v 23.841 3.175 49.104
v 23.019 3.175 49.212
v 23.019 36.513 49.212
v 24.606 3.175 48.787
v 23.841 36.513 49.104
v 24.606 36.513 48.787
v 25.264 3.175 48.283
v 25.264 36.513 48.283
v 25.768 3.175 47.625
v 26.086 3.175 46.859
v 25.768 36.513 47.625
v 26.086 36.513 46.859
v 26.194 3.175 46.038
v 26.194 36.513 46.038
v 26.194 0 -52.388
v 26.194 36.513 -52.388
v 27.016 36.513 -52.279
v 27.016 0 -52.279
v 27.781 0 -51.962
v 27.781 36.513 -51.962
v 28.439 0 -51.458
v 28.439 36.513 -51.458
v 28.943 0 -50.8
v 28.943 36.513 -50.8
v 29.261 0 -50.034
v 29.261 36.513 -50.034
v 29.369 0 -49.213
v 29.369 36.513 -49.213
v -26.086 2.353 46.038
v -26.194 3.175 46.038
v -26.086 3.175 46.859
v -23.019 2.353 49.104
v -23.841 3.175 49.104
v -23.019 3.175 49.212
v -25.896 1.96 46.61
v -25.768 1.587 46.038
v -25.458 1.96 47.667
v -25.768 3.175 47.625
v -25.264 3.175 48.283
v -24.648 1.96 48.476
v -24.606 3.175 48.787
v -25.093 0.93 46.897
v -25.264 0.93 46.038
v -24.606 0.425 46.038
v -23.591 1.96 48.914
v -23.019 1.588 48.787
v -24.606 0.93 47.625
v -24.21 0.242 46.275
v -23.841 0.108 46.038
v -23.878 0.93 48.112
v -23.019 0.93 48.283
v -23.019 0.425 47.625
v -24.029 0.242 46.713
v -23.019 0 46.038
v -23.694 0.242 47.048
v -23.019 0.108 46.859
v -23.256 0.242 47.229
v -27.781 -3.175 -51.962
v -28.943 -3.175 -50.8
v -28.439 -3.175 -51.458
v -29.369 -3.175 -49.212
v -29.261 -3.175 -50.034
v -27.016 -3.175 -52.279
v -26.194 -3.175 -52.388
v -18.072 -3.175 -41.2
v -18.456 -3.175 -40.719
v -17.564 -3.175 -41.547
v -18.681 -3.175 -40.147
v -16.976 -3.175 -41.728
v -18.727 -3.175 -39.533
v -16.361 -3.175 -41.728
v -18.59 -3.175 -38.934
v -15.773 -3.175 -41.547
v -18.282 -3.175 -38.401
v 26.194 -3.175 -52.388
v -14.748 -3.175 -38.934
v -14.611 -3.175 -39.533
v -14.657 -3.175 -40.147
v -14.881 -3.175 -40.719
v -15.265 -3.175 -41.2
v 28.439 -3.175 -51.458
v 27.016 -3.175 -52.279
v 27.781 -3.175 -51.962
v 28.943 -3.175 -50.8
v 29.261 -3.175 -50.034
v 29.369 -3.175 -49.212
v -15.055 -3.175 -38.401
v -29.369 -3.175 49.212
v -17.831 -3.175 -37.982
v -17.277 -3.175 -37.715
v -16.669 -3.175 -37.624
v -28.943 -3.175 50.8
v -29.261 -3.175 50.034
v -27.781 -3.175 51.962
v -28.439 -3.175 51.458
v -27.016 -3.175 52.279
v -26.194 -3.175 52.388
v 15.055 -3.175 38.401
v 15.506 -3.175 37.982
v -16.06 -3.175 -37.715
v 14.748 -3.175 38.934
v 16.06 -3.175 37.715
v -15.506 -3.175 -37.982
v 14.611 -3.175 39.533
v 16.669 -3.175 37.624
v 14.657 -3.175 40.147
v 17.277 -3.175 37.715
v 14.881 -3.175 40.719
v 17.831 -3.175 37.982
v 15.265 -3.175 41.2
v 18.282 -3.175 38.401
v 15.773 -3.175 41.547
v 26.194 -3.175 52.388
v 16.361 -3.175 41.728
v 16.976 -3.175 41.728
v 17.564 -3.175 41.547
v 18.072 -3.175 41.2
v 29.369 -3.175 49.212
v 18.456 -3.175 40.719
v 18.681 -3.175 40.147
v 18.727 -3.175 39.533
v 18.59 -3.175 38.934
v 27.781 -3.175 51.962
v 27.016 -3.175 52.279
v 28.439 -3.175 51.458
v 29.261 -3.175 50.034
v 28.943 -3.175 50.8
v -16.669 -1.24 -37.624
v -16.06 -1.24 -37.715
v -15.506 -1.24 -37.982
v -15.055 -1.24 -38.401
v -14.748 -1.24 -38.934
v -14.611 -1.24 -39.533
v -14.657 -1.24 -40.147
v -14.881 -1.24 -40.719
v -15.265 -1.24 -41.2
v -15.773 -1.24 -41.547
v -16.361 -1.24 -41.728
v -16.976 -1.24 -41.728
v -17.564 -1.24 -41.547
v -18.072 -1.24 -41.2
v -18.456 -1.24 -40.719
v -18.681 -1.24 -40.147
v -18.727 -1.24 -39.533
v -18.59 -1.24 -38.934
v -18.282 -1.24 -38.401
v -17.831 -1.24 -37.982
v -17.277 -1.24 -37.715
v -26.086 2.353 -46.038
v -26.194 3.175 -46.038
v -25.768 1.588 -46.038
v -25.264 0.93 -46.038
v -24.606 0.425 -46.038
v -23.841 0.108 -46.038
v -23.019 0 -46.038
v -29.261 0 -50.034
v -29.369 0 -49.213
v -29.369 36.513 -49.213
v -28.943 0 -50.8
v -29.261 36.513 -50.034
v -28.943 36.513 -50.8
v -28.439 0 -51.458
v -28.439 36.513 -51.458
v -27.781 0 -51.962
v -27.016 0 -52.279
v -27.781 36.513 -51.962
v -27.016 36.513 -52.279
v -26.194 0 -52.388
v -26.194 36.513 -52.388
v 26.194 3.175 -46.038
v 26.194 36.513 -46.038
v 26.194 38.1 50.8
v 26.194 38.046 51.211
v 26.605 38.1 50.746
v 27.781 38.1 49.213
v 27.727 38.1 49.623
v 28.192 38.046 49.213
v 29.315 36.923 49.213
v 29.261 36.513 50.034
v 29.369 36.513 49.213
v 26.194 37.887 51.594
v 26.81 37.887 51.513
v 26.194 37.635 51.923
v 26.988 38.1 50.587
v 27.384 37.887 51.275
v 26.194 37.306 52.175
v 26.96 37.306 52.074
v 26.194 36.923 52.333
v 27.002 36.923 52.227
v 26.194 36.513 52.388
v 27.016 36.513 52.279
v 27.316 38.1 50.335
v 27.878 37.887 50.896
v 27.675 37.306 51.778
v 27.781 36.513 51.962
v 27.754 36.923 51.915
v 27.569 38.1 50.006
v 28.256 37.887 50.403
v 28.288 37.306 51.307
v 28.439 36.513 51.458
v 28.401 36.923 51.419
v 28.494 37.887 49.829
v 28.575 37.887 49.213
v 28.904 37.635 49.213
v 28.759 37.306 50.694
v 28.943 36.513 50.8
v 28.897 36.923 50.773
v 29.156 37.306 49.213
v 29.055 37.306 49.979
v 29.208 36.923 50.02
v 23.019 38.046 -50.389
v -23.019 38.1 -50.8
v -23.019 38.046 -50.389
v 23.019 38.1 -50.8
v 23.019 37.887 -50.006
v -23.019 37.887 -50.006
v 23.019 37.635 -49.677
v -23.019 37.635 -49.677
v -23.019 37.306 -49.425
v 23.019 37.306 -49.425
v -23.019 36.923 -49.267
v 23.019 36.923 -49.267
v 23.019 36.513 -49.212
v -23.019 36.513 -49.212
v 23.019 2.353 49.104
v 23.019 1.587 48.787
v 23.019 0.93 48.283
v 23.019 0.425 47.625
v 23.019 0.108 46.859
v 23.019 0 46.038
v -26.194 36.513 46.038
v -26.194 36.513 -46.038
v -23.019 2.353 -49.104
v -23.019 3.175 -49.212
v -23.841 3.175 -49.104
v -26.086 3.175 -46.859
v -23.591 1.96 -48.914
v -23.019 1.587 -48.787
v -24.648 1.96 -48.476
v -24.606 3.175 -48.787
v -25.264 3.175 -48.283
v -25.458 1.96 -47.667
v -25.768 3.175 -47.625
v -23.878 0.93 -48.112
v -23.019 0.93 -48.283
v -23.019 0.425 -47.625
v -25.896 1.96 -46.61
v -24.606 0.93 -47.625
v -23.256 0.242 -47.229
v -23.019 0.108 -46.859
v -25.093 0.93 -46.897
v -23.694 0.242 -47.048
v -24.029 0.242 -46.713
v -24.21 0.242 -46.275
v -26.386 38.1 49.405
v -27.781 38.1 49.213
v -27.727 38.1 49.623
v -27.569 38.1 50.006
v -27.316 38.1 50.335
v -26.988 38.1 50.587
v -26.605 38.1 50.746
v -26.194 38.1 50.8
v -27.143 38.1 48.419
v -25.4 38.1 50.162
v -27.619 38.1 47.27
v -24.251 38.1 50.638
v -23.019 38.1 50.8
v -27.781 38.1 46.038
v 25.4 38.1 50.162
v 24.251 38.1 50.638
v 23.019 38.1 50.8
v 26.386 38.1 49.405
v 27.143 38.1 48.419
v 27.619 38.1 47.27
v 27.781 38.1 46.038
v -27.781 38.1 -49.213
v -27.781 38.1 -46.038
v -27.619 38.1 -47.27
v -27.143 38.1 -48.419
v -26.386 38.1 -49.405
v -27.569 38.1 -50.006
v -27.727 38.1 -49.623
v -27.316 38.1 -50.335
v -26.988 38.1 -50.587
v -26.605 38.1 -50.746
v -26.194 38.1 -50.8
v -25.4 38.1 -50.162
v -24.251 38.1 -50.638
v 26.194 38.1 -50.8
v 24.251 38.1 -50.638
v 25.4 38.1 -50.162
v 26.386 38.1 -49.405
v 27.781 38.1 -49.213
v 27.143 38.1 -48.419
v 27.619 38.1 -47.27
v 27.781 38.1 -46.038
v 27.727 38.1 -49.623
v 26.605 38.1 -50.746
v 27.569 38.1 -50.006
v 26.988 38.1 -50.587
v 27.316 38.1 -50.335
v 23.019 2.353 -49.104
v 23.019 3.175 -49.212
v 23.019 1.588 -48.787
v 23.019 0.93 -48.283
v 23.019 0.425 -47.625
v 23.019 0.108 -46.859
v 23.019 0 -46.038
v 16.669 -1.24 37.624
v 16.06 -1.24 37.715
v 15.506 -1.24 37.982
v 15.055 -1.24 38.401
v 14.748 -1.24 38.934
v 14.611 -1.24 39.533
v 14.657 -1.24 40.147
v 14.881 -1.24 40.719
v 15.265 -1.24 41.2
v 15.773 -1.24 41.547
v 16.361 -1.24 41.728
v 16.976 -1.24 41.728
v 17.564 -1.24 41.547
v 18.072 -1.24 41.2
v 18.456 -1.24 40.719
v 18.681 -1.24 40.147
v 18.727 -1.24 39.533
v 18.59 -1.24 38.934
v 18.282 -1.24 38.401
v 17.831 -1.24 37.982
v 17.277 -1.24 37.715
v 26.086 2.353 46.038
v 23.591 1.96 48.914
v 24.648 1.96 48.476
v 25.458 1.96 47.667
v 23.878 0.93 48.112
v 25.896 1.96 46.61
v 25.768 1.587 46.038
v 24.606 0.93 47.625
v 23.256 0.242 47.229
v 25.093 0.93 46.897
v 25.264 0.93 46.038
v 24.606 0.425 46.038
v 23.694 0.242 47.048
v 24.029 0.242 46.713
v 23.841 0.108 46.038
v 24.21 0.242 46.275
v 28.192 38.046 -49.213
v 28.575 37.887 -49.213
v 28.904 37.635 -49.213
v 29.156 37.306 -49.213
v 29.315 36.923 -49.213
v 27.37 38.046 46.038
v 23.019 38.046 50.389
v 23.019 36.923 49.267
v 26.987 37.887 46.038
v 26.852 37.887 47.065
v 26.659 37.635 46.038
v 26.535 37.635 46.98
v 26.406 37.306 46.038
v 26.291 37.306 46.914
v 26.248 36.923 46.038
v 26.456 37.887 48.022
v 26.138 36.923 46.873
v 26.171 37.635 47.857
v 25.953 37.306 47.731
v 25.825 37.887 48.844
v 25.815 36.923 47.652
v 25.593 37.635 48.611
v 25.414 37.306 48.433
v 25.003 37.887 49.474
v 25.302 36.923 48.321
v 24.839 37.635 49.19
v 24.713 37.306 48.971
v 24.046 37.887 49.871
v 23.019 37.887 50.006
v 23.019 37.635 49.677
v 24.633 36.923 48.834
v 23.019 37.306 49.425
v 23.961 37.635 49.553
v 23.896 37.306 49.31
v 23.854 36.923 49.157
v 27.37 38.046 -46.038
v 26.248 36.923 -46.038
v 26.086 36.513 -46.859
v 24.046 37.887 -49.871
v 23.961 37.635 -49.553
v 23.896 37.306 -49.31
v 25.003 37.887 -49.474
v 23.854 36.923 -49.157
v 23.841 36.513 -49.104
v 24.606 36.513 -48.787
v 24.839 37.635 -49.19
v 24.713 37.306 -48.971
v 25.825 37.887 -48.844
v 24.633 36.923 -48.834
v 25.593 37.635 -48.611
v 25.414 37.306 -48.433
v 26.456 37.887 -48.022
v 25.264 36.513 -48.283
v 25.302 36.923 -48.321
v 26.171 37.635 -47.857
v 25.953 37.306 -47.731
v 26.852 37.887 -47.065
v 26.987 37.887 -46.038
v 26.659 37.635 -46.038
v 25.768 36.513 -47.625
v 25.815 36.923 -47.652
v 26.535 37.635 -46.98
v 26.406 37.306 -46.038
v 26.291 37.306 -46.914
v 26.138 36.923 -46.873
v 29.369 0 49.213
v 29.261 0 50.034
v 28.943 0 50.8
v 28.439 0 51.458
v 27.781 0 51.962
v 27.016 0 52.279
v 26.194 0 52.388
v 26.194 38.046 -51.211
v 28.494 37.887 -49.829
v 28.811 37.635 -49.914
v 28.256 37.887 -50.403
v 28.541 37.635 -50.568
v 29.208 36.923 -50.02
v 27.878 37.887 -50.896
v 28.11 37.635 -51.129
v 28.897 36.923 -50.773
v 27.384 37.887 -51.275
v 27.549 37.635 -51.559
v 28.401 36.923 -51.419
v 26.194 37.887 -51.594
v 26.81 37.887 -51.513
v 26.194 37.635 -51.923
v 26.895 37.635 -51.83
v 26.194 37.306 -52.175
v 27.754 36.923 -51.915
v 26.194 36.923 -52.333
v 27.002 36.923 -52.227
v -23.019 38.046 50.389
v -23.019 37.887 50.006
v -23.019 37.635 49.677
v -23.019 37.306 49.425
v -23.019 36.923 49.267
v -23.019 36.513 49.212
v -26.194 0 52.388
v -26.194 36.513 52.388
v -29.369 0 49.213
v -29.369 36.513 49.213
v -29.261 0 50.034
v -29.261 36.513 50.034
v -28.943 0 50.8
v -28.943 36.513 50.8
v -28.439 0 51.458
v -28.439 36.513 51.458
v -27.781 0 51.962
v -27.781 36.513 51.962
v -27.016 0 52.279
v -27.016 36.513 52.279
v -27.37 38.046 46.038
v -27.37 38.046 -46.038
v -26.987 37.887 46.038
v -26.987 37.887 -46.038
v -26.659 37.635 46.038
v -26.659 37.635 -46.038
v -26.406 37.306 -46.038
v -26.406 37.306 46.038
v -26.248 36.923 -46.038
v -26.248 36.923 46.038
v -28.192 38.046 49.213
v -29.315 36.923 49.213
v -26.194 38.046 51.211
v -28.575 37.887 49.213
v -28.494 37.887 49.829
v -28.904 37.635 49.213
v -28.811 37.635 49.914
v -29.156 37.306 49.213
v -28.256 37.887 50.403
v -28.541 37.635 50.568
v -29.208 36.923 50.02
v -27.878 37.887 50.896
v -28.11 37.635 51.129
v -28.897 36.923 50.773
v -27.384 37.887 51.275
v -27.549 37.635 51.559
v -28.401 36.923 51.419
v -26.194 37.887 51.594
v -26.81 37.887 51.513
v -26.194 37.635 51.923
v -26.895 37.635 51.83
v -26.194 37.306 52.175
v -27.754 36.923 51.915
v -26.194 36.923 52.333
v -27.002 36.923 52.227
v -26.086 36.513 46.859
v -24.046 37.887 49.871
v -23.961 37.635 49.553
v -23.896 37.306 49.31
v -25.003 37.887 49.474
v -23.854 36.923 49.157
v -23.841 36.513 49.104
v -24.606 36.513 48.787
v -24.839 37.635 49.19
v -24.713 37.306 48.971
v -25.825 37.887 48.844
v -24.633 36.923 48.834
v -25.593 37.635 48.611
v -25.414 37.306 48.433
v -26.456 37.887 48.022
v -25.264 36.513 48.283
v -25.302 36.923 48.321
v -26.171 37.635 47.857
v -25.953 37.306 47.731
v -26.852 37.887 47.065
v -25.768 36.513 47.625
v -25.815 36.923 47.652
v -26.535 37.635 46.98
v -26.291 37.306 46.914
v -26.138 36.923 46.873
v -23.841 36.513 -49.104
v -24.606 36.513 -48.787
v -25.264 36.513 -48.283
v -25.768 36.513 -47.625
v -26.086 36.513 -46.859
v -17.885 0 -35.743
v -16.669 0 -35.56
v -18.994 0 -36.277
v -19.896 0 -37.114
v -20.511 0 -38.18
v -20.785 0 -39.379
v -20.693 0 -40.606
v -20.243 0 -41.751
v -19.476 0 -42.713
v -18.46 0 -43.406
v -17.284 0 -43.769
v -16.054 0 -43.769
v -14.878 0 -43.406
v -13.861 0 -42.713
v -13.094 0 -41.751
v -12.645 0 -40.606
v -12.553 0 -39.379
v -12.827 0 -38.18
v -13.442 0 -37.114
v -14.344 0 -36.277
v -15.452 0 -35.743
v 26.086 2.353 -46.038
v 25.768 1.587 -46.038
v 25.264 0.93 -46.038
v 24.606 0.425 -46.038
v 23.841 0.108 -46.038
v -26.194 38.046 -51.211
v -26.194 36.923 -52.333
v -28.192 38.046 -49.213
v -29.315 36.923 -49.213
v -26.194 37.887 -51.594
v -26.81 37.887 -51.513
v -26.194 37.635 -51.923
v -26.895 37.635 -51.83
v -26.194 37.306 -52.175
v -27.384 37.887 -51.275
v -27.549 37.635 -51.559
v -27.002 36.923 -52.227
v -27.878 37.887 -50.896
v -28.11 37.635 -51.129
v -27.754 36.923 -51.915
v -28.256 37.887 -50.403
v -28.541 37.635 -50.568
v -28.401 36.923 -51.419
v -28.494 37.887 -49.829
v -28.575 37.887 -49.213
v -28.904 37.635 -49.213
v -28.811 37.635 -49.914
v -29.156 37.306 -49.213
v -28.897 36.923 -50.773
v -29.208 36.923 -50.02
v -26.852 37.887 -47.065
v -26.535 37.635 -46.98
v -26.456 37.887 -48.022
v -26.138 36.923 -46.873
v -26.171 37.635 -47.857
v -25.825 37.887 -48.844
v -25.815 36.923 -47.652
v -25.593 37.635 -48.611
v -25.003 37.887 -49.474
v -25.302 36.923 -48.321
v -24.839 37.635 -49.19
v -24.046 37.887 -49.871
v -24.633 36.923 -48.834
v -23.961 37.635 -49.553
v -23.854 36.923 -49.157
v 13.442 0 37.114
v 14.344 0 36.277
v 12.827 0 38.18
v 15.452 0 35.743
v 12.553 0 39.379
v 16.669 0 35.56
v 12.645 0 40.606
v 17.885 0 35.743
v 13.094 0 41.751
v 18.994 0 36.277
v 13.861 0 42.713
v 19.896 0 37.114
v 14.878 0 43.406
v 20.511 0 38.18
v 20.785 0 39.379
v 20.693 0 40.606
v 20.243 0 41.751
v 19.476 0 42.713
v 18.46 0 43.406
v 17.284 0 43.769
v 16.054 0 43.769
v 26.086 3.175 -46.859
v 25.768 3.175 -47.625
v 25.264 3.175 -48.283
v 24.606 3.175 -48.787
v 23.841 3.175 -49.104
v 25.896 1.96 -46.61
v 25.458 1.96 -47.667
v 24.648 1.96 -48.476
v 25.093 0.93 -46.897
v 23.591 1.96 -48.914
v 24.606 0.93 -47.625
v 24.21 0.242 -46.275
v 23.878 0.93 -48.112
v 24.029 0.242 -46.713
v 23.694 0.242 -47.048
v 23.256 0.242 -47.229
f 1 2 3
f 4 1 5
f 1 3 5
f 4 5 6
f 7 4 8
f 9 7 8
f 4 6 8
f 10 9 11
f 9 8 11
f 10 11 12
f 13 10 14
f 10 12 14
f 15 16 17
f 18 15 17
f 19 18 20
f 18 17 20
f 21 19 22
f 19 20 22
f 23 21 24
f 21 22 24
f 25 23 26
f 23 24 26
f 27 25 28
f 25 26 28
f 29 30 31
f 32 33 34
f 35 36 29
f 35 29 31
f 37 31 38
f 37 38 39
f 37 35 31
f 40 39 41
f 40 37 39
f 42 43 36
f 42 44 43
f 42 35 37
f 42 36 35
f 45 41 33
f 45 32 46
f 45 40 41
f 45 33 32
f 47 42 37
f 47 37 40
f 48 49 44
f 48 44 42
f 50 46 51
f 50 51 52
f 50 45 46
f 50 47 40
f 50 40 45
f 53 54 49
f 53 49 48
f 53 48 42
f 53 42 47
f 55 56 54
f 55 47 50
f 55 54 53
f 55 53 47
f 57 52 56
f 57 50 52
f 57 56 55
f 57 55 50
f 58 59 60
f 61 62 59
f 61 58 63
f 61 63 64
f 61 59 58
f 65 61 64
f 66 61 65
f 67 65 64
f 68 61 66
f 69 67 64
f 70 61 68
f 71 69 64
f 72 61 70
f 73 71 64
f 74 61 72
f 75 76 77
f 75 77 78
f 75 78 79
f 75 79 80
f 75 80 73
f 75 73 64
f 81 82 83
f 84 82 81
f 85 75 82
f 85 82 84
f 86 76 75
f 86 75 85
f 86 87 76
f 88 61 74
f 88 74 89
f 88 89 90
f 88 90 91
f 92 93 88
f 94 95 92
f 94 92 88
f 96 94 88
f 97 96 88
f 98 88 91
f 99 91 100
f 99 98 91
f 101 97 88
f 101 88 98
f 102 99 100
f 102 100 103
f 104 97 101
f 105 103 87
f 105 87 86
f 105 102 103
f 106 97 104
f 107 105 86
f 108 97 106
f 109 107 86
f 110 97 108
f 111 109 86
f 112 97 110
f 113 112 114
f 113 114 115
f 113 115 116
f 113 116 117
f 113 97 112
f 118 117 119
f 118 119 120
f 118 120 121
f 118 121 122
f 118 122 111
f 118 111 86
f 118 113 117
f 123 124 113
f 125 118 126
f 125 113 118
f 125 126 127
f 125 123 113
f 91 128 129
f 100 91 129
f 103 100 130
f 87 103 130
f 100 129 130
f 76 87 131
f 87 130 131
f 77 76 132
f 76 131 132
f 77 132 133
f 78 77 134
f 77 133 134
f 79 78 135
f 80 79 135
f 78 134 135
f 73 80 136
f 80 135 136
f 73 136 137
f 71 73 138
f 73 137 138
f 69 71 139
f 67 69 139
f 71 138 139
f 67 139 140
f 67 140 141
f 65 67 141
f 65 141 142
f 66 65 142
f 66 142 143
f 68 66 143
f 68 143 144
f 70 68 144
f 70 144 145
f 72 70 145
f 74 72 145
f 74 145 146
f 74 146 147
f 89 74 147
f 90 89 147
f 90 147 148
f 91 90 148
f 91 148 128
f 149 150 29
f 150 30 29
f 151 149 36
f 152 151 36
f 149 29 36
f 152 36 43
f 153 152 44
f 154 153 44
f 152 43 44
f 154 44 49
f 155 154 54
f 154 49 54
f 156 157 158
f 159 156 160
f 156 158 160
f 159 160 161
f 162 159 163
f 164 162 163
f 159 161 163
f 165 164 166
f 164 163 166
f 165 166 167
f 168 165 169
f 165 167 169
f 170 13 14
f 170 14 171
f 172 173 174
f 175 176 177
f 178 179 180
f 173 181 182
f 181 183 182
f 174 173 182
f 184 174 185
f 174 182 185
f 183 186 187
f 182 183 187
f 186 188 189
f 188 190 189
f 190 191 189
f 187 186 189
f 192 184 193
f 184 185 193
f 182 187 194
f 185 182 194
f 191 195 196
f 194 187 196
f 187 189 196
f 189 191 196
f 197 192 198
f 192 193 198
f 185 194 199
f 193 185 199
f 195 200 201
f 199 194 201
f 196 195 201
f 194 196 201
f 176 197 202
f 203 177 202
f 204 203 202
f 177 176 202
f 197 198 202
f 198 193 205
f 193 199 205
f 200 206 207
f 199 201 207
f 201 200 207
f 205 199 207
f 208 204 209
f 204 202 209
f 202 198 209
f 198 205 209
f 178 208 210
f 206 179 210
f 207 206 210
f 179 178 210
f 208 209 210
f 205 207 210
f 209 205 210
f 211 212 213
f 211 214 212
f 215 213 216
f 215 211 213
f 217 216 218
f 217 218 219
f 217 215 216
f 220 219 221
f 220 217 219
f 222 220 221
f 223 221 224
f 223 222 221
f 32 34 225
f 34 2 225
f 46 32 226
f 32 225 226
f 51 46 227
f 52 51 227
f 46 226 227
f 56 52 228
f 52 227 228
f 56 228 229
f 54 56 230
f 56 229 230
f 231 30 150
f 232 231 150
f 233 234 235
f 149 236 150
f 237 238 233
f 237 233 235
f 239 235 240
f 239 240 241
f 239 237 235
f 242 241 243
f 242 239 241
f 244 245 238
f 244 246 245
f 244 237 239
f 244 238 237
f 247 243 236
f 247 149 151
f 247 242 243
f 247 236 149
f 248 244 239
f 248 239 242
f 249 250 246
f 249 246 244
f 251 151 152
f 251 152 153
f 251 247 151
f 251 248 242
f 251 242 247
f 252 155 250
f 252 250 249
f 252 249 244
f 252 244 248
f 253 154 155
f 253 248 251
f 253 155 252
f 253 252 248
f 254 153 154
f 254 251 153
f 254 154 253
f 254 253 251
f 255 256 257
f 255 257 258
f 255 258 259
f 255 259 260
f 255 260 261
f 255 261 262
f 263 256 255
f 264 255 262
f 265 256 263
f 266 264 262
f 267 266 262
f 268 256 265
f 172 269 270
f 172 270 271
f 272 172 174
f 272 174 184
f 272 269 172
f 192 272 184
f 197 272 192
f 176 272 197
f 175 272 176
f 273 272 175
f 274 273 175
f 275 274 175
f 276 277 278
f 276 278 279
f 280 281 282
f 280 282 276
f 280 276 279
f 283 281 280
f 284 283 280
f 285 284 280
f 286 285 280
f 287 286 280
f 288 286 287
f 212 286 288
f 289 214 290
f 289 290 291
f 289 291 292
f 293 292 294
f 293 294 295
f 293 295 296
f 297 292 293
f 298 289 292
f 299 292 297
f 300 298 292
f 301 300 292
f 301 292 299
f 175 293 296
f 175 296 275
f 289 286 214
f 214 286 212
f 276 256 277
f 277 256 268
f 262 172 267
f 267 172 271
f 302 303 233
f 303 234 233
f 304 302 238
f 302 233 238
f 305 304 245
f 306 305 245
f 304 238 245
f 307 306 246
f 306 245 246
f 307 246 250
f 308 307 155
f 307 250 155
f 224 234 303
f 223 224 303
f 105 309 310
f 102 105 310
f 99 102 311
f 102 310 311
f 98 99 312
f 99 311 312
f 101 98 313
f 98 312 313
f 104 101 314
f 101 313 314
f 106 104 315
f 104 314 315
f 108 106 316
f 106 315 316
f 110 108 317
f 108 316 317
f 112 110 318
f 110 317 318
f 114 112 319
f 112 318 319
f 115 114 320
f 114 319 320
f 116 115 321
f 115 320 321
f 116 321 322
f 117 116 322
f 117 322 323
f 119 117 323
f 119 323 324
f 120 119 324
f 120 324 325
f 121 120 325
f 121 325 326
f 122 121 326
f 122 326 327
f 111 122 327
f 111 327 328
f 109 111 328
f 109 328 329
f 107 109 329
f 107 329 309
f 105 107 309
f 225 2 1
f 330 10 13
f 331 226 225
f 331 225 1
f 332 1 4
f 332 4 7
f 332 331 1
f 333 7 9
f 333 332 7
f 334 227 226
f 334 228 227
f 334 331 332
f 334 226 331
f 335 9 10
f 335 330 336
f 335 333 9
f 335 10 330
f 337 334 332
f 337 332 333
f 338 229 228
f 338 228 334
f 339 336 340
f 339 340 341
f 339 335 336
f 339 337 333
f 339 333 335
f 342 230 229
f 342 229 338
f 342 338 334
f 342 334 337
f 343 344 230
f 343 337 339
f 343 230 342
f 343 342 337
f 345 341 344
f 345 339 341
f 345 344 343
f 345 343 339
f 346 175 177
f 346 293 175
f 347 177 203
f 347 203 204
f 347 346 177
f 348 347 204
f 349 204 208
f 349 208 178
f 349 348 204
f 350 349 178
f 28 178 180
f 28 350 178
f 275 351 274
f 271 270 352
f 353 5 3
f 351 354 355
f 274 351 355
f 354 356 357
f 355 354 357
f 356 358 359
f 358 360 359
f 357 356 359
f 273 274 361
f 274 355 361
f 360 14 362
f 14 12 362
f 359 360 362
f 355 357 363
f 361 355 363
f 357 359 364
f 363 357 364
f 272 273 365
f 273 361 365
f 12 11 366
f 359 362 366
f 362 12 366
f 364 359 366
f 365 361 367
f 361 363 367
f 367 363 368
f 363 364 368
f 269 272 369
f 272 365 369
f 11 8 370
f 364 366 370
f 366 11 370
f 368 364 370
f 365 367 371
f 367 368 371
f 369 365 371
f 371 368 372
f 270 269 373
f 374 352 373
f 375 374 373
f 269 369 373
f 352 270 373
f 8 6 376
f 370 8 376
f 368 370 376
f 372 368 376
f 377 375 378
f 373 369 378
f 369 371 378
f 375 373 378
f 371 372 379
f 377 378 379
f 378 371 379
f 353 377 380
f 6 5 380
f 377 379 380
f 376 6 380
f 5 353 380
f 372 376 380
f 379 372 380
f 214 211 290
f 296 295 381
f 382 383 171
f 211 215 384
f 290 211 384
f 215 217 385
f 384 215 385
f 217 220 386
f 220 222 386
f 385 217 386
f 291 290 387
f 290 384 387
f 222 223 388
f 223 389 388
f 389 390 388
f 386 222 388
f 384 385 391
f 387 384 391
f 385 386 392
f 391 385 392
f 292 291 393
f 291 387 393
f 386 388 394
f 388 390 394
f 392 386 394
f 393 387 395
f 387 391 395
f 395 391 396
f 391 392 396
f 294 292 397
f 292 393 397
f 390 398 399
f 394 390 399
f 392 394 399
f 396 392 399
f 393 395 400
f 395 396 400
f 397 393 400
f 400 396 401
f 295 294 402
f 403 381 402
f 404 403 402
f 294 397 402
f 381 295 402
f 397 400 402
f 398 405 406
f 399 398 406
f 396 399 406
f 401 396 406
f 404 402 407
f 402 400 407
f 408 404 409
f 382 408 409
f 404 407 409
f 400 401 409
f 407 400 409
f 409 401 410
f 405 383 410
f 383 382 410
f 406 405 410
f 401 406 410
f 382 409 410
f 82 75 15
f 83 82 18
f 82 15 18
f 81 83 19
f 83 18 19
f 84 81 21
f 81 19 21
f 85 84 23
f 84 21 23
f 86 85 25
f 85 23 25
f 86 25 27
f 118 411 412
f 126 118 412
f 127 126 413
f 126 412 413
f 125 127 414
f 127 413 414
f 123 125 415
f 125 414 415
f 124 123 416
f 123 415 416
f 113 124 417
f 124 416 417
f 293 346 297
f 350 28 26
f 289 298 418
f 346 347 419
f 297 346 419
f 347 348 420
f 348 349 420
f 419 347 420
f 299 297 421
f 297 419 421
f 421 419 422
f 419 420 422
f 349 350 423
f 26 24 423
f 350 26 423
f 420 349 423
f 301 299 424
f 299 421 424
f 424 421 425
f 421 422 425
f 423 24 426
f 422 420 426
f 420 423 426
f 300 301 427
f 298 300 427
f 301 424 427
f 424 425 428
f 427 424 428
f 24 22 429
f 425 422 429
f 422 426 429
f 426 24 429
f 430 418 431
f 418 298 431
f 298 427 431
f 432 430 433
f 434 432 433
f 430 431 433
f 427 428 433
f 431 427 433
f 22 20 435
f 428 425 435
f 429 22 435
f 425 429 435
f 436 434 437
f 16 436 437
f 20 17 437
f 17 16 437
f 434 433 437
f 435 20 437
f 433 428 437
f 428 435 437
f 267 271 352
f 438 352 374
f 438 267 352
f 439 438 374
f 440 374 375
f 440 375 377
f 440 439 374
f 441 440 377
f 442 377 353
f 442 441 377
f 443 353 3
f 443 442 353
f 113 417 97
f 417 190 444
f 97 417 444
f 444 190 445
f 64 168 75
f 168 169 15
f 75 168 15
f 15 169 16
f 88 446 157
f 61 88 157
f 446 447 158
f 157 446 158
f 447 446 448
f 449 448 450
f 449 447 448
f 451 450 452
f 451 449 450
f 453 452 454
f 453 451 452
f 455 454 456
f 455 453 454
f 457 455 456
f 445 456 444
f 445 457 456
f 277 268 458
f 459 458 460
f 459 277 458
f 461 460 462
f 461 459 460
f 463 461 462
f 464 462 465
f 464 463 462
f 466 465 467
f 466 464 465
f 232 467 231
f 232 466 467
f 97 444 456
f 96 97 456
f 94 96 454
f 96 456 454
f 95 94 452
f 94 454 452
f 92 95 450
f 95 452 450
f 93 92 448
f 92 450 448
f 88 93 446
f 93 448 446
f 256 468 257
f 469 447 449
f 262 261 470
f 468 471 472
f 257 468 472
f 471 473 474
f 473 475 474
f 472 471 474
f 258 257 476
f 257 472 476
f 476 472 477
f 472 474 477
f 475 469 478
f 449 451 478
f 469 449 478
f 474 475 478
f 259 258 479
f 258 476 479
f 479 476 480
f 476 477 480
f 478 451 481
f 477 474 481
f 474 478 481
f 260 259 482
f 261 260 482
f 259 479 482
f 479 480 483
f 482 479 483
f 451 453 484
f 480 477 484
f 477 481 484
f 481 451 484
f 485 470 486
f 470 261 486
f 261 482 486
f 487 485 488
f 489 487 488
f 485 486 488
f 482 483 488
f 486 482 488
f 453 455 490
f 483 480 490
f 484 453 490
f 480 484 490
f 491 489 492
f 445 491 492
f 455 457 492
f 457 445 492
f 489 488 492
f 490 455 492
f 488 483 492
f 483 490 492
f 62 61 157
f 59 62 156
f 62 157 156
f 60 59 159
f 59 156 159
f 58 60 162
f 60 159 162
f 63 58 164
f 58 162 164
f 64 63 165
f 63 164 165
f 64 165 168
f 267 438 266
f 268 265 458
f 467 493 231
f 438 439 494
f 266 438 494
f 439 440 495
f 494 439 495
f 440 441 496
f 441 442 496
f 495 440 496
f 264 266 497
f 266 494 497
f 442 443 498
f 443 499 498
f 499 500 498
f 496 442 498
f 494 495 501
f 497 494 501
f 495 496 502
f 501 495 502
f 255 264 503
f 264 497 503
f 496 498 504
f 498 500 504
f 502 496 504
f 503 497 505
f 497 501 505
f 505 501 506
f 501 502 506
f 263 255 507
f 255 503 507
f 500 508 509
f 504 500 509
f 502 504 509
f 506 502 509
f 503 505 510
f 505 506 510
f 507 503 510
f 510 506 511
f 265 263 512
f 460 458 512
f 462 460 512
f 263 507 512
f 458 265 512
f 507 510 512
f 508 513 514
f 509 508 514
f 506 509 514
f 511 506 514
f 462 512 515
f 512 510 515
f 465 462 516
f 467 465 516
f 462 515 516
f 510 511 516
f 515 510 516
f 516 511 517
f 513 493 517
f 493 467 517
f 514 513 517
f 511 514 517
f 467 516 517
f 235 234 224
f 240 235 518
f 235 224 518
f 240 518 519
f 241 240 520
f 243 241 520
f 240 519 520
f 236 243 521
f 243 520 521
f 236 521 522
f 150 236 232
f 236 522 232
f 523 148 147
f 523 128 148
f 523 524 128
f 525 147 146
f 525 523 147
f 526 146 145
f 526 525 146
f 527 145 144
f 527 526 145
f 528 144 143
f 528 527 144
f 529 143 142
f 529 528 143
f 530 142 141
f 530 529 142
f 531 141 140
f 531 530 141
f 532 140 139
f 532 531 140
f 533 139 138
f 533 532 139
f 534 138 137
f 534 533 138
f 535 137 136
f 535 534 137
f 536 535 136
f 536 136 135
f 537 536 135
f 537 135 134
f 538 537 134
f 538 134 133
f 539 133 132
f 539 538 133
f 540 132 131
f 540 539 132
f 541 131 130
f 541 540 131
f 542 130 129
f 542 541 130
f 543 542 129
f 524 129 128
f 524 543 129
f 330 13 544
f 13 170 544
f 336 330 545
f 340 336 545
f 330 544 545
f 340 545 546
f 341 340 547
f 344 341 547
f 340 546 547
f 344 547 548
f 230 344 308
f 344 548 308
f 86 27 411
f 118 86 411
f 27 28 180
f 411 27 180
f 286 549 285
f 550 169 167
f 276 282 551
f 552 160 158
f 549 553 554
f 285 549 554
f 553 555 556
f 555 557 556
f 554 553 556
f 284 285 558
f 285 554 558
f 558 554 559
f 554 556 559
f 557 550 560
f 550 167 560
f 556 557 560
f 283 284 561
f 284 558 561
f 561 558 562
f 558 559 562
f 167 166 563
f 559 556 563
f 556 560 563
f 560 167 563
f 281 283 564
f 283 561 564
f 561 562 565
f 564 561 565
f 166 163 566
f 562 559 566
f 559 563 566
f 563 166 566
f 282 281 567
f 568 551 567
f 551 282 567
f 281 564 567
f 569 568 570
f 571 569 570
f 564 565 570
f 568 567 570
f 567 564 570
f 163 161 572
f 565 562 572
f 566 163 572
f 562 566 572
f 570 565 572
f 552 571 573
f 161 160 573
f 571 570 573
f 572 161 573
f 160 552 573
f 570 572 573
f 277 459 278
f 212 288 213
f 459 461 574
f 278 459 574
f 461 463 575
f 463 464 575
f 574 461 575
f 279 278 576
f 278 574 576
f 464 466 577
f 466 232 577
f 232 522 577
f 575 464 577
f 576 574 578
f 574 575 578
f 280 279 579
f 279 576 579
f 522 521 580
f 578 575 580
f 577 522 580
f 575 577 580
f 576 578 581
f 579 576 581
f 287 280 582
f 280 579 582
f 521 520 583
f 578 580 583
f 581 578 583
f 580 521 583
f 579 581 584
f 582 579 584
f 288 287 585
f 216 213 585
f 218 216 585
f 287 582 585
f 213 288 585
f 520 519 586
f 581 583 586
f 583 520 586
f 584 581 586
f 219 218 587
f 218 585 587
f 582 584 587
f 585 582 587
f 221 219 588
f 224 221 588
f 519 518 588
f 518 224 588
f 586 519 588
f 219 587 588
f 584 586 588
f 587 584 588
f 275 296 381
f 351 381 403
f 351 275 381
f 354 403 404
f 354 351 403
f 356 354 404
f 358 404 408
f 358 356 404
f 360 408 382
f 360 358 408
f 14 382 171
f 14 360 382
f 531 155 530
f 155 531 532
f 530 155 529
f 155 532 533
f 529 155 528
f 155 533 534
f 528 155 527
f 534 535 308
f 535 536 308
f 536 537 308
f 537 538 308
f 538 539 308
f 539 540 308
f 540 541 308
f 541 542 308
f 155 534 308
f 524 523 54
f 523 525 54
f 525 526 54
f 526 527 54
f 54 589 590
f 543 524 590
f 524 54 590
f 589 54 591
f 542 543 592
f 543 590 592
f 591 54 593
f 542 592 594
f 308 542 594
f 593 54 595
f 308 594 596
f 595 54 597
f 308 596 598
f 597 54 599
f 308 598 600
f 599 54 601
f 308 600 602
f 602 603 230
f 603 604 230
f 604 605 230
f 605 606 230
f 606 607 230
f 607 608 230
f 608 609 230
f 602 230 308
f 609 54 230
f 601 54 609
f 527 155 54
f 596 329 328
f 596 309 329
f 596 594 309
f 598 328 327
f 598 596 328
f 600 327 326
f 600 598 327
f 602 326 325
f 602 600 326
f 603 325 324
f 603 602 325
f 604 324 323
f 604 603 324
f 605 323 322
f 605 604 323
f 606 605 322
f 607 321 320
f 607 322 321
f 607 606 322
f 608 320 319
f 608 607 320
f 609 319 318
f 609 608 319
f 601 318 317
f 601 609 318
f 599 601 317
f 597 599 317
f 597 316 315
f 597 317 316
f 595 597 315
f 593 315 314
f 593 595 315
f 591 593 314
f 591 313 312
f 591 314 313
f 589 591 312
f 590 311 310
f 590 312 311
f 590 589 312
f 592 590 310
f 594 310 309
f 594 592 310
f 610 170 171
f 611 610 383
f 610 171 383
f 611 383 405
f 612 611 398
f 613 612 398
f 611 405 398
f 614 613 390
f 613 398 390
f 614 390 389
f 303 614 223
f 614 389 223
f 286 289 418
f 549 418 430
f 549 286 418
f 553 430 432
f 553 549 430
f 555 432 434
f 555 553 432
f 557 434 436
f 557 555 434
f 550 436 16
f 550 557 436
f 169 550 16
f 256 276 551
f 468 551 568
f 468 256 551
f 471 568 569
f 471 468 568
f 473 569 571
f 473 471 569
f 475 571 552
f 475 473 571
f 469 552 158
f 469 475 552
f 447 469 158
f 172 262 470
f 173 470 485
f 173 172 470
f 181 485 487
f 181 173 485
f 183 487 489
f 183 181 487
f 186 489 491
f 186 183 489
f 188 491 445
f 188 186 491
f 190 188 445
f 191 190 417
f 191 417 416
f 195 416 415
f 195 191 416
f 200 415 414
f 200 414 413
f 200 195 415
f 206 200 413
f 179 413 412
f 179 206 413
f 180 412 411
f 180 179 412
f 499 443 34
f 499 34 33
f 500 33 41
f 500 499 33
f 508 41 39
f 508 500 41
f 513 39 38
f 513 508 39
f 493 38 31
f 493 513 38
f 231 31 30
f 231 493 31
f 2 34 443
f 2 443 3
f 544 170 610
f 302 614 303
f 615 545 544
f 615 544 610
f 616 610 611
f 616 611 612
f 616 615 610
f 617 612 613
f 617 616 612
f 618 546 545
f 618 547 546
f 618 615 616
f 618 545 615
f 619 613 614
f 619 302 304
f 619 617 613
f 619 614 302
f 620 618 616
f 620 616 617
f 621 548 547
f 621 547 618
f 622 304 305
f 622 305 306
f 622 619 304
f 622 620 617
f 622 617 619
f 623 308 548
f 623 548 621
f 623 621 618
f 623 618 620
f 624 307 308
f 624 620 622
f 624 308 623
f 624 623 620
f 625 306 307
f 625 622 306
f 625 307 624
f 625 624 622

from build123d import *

# Parameters (mm, degrees)
SKETCH1_W           = 58.7375
SKETCH1_H           = 104.775
SKETCH1_W_2         = 52.3875
SKETCH1_H_2         = 98.425
EXTRUDE_THIN1_DEPTH = 38.1
FILLET1_R           = 3.175
BOSS_EXTRUDE1_DEPTH = 3.175
FILLET2_R           = 3.175
SKETCH3_R           = 2.06375
CUT_EXTRUDE1_DEPTH  = 3.175
CIRPATTERN1_COUNT   = 2
FILLET3_R           = 1.5875


with BuildPart() as part:
    # Sketch1 → Extrude-Thin1 (new body)
    with BuildSketch(Plane(origin=(0, 0, 0), x_dir=(1, 0, 0), z_dir=(0, 1, 0))):
        Rectangle(SKETCH1_W, SKETCH1_H)
        Rectangle(SKETCH1_W_2, SKETCH1_H_2, mode=Mode.SUBTRACT)
    extrude(amount=EXTRUDE_THIN1_DEPTH)

    # Fillet1
    fillet1_edges = [part.edges().sort_by_distance(p)[0] for p in [
        (26.19375, 19.05, 49.2125),
        (26.19375, 19.05, -49.2125),
        (-26.19375, 19.05, -49.2125),
        (-26.19375, 19.05, 49.2125),
        (29.36875, 19.05, 52.3875),
        (-29.36875, 19.05, 52.3875),
        (-29.36875, 19.05, -52.3875),
        (29.36875, 19.05, -52.3875),
    ]]
    fillet(fillet1_edges, radius=FILLET1_R)

    # Sketch2 → Boss-Extrude1 (add)
    with BuildSketch(Plane.XZ):
        with BuildLine():
            Line((29.36875, -49.2125), (29.36875, 49.2125))
            ThreePointArc((29.36875, 49.2125), (28.43881403, 51.45756403), (26.19375, 52.3875))
            Line((26.19375, 52.3875), (-26.19375, 52.3875))
            ThreePointArc((-26.19375, 52.3875), (-28.43881403, 51.45756403), (-29.36875, 49.2125))
            Line((-29.36875, 49.2125), (-29.36875, -49.2125))
            ThreePointArc((-29.36875, -49.2125), (-28.43881403, -51.45756403), (-26.19375, -52.3875))
            Line((-26.19375, -52.3875), (26.19375, -52.3875))
            ThreePointArc((26.19375, -52.3875), (28.43881403, -51.45756403), (29.36875, -49.2125))
        make_face()
    extrude(amount=BOSS_EXTRUDE1_DEPTH)

    # Fillet2
    fillet2_edges = [part.edges().sort_by_distance(p)[0] for p in [
        (26.19375, 0, 0),
        (0, 0, -49.2125),
        (-26.19375, 0, 0),
        (0, 0, 49.2125),
        (-25.26381403, 0, 48.28256403),
        (25.26381403, 0, 48.28256403),
        (25.26381403, 0, -48.28256403),
        (-25.26381403, 0, -48.28256403),
    ]]
    fillet(fillet2_edges, radius=FILLET2_R)

    # Sketch3 → Cut-Extrude1 (cut)
    with BuildSketch(Plane(origin=(0, 0, 0), x_dir=(1, 0, 0), z_dir=(0, 1, 0))):
        with Locations(Location((-16.66875, 39.6875, 0), (0, 0, 270))):
            Circle(SKETCH3_R)
    cut_extrude1 = extrude(amount=-CUT_EXTRUDE1_DEPTH, mode=Mode.SUBTRACT)

    # Sketch4 → Cut-Revolve1 (revolve, cut)
    with BuildSketch(Plane.YX.offset(39.6875), mode=Mode.PRIVATE) as cut_revolve1_sk:
        Polygon((-2.480052205, -16.66875), (0, -12.54125), (0, -16.66875), align=None)
    cut_revolve1 = revolve(cut_revolve1_sk.sketch.rotate(Axis((-16.66875, 0, -39.6875), (0, -1, 0)), 90), axis=Axis((-16.66875, 0, -39.6875), (0, -1, 0)), mode=Mode.SUBTRACT)

    # CirPattern1: Cut-Extrude1, Cut-Revolve1 ×2 about axis
    cirpattern1_axis = Axis((0, 0, 0), (0, 1, 0))
    add([cut_extrude1.rotate(cirpattern1_axis, i * 360 / CIRPATTERN1_COUNT) for i in range(1, CIRPATTERN1_COUNT)], mode=Mode.SUBTRACT)
    add([cut_revolve1.rotate(cirpattern1_axis, i * 360 / CIRPATTERN1_COUNT) for i in range(1, CIRPATTERN1_COUNT)], mode=Mode.SUBTRACT)

    # Fillet3
    fillet3_edges = [part.edges().sort_by_distance(p)[0] for p in [
        (29.36875, 38.1, 0),
        (0, 38.1, 52.3875),
        (0, 38.1, -52.3875),
        (-29.36875, 38.1, 0),
        (0, 38.1, -49.2125),
        (26.19375, 38.1, 0),
        (0, 38.1, 49.2125),
        (-26.19375, 38.1, 0),
        (-28.43881403, 38.1, 51.45756403),
        (28.43881403, 38.1, -51.45756403),
        (-28.43881403, 38.1, -51.45756403),
        (28.43881403, 38.1, 51.45756403),
        (-25.26381403, 38.1, 48.28256403),
        (25.26381403, 38.1, 48.28256403),
        (25.26381403, 38.1, -48.28256403),
        (-25.26381403, 38.1, -48.28256403),
    ]]
    fillet(fillet3_edges, radius=FILLET3_R - 0.0001)  # a hair under: the kernel refuses the full size


solid = part.part
